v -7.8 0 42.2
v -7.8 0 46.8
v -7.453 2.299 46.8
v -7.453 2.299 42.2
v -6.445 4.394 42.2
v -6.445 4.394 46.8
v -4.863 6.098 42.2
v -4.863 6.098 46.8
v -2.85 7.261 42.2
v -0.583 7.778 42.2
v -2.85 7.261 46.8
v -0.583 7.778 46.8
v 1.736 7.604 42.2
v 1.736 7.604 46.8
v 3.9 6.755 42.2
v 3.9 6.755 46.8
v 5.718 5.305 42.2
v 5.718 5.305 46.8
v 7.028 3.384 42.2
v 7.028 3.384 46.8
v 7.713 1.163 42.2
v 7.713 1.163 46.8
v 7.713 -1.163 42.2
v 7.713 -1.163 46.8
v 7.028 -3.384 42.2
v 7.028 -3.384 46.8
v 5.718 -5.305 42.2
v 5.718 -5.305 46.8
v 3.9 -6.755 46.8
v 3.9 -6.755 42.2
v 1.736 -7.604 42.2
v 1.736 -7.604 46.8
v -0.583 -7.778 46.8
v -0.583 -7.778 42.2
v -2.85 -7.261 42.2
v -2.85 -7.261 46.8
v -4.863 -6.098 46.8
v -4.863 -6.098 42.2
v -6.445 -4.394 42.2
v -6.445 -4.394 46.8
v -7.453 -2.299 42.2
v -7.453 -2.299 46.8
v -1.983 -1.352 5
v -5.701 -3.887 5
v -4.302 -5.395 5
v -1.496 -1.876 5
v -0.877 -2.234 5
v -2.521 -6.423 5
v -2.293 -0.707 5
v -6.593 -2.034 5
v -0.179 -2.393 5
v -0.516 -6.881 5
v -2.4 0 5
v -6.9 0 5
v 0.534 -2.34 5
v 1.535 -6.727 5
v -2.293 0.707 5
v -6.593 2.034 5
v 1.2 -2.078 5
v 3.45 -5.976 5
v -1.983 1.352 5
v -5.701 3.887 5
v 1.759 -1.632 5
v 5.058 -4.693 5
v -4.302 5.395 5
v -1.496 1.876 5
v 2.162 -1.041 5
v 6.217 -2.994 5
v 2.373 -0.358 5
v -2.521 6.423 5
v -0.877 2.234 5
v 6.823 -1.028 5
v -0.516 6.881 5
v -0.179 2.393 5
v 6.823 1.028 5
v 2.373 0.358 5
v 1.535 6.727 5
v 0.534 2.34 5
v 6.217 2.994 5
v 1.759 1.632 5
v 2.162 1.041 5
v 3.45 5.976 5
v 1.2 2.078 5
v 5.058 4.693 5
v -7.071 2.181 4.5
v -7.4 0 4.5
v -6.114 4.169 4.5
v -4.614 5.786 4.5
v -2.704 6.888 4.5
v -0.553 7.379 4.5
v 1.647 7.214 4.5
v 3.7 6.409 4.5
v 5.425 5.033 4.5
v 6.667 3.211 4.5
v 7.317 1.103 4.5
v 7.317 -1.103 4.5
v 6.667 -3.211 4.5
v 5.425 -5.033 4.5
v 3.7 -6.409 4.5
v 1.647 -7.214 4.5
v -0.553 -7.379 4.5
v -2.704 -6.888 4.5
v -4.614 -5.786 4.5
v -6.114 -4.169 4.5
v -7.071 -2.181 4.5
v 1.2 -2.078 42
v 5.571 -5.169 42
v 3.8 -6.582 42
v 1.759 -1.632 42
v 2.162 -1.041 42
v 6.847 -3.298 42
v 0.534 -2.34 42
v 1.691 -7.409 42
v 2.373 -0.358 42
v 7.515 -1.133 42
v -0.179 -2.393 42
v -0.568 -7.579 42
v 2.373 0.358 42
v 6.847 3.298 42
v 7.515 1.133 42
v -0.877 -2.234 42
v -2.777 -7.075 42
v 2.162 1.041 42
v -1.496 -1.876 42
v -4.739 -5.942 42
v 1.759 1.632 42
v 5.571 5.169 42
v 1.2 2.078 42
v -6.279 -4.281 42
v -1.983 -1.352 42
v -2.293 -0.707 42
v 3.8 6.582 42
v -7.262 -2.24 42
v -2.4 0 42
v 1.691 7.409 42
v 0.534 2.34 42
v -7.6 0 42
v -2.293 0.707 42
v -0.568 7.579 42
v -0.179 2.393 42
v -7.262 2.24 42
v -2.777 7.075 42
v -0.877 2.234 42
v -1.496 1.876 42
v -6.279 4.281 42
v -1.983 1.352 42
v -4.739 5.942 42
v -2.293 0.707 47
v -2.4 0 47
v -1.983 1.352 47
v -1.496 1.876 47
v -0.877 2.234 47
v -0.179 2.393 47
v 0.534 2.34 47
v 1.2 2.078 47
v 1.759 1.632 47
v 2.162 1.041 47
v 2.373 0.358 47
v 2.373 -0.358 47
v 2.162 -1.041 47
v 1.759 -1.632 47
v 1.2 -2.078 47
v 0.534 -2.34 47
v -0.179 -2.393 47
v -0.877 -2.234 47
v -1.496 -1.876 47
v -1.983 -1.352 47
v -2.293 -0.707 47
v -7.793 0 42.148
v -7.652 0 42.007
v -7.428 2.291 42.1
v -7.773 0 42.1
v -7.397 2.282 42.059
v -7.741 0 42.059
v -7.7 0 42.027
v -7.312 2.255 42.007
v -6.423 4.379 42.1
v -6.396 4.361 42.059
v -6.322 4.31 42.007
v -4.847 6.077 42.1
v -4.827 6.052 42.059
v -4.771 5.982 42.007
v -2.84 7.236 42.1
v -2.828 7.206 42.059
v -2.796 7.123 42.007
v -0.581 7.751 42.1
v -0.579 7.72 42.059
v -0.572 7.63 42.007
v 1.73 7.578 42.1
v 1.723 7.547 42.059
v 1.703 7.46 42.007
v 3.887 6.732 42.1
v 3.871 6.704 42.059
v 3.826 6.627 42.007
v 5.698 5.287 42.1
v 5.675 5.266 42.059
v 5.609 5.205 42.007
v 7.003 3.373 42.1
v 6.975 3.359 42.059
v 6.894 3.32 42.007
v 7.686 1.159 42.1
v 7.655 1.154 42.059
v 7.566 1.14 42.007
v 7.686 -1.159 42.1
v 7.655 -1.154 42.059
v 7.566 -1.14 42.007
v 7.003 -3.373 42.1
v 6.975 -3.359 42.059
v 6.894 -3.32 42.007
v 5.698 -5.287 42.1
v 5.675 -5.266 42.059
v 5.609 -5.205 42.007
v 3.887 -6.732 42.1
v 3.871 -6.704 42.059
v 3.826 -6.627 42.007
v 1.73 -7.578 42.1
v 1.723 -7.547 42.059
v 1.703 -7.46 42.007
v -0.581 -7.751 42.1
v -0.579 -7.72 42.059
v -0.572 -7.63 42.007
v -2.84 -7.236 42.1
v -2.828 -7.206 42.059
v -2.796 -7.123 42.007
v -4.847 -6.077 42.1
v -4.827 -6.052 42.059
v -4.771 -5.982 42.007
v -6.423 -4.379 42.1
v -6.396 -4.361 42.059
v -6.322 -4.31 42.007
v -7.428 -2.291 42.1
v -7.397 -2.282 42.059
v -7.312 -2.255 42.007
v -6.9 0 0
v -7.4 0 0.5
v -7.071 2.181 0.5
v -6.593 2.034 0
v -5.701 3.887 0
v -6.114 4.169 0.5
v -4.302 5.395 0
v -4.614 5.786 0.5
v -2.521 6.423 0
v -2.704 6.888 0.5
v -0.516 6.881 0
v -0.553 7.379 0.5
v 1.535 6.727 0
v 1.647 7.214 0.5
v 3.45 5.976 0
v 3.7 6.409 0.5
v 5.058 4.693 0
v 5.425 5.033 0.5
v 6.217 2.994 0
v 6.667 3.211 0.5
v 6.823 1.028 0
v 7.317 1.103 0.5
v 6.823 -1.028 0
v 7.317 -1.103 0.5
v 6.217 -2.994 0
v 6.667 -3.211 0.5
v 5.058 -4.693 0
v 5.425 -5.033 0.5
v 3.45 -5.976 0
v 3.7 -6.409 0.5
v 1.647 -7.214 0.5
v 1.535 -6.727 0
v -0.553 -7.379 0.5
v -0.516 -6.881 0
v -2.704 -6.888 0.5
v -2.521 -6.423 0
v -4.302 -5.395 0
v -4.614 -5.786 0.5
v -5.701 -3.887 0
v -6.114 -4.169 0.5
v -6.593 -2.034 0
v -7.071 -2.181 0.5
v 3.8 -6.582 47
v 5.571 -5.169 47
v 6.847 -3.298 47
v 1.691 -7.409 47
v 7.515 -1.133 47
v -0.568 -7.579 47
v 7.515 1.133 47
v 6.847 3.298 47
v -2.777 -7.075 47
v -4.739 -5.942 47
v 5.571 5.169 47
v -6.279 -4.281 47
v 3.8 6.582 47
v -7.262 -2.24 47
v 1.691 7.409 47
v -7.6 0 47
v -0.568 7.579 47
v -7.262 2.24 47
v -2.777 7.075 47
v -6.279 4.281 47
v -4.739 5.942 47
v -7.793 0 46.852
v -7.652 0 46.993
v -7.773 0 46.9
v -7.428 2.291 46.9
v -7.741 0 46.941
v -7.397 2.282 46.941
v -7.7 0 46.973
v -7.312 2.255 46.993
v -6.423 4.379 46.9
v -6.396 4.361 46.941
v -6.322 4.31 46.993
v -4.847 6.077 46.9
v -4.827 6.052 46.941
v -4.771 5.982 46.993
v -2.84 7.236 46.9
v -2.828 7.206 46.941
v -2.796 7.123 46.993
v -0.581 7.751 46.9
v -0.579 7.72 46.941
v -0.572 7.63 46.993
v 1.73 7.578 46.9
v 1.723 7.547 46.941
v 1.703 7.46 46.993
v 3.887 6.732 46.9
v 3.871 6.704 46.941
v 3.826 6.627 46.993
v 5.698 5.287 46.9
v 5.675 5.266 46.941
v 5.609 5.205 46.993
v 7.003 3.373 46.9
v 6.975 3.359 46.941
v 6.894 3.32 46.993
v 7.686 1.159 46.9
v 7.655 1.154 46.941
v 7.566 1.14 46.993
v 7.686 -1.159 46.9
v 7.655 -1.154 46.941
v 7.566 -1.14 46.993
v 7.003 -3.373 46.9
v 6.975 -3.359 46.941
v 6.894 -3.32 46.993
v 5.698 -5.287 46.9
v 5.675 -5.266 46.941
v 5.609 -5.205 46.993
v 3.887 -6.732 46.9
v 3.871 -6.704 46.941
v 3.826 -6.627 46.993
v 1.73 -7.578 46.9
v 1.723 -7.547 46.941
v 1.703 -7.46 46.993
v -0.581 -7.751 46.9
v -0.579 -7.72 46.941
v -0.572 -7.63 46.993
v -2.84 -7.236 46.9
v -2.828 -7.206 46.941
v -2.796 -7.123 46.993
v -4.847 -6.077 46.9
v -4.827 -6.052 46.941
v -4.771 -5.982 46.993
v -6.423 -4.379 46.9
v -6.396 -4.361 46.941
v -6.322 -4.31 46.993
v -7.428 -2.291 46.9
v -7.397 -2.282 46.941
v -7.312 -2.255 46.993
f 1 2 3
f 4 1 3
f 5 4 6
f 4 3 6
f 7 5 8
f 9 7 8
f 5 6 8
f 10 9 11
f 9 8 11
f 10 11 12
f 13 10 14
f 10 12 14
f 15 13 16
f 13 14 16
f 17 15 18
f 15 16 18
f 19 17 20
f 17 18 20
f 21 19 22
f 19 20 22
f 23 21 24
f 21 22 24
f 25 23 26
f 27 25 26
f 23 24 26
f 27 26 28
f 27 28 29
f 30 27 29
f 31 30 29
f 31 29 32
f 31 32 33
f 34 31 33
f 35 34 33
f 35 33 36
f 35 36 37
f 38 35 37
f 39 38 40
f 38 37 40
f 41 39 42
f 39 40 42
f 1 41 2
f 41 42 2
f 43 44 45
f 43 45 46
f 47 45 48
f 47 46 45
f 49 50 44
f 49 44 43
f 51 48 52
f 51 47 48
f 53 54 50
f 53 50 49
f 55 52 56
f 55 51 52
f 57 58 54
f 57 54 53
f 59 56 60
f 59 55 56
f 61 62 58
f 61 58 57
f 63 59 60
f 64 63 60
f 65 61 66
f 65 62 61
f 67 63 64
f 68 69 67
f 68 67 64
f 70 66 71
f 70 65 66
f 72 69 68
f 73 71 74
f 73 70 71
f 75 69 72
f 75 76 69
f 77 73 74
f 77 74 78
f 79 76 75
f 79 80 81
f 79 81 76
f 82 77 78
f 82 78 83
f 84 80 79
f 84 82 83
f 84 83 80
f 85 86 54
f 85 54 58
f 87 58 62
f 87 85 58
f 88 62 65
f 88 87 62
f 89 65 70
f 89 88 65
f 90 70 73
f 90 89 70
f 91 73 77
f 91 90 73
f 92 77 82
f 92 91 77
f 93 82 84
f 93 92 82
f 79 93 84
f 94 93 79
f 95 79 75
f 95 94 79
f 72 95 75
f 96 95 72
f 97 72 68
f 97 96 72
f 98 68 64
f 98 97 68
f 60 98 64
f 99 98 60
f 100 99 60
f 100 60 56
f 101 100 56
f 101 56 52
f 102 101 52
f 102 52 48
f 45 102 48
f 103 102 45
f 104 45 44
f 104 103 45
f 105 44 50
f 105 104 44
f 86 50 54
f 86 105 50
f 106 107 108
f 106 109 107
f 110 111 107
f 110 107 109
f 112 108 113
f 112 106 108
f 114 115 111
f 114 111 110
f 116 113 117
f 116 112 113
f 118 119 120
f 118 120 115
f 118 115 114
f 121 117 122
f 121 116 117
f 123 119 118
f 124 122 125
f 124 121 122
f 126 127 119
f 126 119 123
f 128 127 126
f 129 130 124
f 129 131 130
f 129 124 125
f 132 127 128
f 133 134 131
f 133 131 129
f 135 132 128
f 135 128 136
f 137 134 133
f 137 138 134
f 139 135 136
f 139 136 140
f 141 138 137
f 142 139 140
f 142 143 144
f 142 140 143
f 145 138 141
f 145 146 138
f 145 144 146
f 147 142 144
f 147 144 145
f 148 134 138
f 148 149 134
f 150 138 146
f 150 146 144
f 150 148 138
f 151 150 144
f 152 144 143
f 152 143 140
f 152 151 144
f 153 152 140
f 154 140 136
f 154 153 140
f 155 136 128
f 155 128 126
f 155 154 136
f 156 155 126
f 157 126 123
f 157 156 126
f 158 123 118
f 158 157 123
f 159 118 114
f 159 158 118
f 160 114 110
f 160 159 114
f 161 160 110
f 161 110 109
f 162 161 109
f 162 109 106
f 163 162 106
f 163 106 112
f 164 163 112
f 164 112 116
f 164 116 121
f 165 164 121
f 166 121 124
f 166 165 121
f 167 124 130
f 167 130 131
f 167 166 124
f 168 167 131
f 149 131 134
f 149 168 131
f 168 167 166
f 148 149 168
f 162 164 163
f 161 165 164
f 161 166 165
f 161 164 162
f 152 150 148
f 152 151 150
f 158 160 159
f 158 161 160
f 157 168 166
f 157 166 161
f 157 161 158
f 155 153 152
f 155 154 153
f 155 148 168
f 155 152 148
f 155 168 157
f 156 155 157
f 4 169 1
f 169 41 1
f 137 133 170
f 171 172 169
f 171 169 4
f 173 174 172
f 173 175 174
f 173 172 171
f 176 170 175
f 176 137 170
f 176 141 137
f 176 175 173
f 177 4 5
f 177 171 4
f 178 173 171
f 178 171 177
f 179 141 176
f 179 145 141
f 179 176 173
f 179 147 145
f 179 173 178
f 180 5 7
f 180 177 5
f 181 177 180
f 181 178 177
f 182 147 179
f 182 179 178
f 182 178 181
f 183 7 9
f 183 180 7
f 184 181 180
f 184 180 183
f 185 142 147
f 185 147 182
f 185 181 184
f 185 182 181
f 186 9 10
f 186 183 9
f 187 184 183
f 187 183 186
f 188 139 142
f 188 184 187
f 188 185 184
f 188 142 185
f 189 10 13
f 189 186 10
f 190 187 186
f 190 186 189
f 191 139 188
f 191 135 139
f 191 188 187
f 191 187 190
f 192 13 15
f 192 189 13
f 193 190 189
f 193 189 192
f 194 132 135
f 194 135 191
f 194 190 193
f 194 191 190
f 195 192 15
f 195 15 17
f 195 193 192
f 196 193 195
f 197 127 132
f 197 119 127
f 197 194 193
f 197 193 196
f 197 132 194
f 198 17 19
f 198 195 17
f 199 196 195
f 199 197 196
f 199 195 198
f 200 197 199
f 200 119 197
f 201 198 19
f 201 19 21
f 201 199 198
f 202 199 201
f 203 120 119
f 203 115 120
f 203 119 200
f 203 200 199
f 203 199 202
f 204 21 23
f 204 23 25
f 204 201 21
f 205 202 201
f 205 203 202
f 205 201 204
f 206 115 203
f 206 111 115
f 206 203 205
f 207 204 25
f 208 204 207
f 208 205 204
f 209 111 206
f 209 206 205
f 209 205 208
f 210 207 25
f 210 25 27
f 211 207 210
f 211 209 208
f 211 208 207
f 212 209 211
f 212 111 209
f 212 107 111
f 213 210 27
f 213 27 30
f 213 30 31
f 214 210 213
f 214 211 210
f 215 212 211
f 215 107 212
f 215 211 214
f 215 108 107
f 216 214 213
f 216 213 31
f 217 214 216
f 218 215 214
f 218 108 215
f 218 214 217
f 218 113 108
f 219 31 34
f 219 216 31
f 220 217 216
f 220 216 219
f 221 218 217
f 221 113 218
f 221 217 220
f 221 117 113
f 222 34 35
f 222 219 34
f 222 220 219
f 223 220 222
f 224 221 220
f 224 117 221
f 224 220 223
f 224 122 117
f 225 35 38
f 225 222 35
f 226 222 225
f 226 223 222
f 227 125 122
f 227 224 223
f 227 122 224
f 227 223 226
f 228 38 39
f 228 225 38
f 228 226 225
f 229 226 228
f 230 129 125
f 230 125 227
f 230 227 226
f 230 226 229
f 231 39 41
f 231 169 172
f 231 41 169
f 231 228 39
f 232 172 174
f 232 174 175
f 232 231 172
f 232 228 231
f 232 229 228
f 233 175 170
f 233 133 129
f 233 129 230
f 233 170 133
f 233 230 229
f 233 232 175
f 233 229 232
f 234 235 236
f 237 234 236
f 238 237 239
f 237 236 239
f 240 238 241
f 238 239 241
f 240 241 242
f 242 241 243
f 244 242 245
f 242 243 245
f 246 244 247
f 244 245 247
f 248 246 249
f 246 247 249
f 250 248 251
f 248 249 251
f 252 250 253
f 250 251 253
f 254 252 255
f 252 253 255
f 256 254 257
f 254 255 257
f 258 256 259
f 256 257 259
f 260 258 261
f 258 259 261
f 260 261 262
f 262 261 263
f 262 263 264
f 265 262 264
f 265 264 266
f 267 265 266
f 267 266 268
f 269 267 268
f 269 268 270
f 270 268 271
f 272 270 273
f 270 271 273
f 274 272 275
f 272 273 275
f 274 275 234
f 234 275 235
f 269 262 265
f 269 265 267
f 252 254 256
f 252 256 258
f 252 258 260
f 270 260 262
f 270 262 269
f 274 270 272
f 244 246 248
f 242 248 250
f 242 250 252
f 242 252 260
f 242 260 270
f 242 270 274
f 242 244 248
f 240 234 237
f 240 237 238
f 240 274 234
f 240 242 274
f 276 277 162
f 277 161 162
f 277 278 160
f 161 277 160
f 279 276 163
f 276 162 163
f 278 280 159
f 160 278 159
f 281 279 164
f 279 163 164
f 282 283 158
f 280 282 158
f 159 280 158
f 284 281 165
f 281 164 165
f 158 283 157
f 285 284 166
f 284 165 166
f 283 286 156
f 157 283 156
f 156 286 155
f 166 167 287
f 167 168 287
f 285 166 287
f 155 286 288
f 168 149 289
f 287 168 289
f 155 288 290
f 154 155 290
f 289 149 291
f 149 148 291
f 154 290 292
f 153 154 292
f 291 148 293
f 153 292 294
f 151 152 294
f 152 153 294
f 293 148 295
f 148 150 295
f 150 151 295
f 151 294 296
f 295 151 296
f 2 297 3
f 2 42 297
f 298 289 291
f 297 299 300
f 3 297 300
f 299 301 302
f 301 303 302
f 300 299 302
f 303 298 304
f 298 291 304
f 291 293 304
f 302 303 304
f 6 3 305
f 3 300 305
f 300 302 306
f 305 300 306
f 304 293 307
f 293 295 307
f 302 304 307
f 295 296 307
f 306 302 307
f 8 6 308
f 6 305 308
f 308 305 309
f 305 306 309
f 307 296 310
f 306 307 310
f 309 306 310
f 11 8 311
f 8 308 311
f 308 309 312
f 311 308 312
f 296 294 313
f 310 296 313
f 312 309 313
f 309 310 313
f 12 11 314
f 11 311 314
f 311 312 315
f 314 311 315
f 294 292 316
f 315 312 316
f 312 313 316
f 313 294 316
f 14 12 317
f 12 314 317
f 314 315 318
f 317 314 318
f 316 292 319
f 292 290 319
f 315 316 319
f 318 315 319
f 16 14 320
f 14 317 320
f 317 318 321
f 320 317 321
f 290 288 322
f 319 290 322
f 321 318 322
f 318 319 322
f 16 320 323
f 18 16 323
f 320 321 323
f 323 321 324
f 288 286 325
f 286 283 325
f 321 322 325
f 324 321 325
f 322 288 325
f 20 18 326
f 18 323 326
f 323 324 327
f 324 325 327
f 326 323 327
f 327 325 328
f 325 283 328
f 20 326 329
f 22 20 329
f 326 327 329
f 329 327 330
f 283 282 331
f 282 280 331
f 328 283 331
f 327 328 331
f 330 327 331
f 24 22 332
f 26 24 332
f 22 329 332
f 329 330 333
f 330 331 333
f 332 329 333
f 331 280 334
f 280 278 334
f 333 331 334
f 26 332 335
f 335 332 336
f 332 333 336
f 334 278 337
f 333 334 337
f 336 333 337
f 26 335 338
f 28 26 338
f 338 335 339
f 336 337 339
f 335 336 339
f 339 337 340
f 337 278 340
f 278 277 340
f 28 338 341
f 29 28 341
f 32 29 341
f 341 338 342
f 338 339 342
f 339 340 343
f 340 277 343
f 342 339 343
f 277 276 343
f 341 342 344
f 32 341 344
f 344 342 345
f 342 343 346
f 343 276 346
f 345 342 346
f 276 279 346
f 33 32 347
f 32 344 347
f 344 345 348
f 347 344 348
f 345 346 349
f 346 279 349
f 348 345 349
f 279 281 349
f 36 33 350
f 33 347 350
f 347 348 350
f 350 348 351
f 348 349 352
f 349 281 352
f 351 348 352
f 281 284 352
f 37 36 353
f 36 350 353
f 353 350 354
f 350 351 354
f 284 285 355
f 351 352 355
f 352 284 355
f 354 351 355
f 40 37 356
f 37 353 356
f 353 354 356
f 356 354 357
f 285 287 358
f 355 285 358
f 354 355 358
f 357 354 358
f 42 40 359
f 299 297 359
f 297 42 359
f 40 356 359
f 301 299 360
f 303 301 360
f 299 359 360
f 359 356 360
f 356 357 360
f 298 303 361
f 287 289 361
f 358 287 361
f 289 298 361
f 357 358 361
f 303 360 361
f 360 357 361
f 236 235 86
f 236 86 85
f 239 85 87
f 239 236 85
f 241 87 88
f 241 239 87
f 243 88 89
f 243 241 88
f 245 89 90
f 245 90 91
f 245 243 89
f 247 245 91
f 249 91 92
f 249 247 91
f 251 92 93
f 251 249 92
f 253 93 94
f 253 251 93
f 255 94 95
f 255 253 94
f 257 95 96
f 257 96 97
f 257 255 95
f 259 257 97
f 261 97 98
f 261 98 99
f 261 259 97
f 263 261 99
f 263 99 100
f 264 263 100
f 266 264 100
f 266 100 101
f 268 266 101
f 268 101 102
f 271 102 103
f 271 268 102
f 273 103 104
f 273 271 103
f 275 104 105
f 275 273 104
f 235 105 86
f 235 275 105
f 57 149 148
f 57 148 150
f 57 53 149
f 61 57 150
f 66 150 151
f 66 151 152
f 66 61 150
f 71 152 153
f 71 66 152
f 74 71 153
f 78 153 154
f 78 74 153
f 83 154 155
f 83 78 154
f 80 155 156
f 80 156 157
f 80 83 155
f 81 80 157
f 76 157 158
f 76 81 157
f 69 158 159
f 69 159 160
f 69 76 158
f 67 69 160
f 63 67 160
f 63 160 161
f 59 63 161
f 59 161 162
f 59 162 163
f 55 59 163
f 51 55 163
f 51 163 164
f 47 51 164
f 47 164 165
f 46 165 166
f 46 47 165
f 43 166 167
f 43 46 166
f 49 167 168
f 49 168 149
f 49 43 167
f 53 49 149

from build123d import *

# Parameters (mm, degrees)
F2_SIZE = 0.5
F0_W    = 5.4
F0_H    = 5
F4_R    = 0.2


with BuildPart() as f1:
    # F0 (on Front) → F1 (revolve)
    with BuildSketch(Plane.XZ):
        Polygon((-7.4, 0), (0, 0), (0, 47), (-2.4, 47), (-2.4, 42), (-2.4, 5), (-7.4, 5), align=None)
    revolve(axis=Axis((0, 0, 23.5), (0, 0, -1)))

    # F2
    f2_edges = [f1.edges().sort_by_distance(p)[0] for p in [
        (7.4, 0, 5),
        (7.4, 0, 0),
    ]]
    chamfer(f2_edges, length=F2_SIZE)


with BuildPart() as f3:
    # F0 (on Front) → F3 (revolve)
    with BuildSketch(Plane.XZ):
        with Locations((-5.1, 44.5)):
            Rectangle(F0_W, F0_H)
    revolve(axis=Axis((0, 0, 23.5), (0, 0, -1)))

    # F4
    f4_edges = [f3.edges().sort_by_distance(p)[0] for p in [
        (7.8, 0, 47),
        (7.8, 0, 42),
    ]]
    fillet(f4_edges, radius=F4_R)


solid = Compound([f1.part, f3.part])
